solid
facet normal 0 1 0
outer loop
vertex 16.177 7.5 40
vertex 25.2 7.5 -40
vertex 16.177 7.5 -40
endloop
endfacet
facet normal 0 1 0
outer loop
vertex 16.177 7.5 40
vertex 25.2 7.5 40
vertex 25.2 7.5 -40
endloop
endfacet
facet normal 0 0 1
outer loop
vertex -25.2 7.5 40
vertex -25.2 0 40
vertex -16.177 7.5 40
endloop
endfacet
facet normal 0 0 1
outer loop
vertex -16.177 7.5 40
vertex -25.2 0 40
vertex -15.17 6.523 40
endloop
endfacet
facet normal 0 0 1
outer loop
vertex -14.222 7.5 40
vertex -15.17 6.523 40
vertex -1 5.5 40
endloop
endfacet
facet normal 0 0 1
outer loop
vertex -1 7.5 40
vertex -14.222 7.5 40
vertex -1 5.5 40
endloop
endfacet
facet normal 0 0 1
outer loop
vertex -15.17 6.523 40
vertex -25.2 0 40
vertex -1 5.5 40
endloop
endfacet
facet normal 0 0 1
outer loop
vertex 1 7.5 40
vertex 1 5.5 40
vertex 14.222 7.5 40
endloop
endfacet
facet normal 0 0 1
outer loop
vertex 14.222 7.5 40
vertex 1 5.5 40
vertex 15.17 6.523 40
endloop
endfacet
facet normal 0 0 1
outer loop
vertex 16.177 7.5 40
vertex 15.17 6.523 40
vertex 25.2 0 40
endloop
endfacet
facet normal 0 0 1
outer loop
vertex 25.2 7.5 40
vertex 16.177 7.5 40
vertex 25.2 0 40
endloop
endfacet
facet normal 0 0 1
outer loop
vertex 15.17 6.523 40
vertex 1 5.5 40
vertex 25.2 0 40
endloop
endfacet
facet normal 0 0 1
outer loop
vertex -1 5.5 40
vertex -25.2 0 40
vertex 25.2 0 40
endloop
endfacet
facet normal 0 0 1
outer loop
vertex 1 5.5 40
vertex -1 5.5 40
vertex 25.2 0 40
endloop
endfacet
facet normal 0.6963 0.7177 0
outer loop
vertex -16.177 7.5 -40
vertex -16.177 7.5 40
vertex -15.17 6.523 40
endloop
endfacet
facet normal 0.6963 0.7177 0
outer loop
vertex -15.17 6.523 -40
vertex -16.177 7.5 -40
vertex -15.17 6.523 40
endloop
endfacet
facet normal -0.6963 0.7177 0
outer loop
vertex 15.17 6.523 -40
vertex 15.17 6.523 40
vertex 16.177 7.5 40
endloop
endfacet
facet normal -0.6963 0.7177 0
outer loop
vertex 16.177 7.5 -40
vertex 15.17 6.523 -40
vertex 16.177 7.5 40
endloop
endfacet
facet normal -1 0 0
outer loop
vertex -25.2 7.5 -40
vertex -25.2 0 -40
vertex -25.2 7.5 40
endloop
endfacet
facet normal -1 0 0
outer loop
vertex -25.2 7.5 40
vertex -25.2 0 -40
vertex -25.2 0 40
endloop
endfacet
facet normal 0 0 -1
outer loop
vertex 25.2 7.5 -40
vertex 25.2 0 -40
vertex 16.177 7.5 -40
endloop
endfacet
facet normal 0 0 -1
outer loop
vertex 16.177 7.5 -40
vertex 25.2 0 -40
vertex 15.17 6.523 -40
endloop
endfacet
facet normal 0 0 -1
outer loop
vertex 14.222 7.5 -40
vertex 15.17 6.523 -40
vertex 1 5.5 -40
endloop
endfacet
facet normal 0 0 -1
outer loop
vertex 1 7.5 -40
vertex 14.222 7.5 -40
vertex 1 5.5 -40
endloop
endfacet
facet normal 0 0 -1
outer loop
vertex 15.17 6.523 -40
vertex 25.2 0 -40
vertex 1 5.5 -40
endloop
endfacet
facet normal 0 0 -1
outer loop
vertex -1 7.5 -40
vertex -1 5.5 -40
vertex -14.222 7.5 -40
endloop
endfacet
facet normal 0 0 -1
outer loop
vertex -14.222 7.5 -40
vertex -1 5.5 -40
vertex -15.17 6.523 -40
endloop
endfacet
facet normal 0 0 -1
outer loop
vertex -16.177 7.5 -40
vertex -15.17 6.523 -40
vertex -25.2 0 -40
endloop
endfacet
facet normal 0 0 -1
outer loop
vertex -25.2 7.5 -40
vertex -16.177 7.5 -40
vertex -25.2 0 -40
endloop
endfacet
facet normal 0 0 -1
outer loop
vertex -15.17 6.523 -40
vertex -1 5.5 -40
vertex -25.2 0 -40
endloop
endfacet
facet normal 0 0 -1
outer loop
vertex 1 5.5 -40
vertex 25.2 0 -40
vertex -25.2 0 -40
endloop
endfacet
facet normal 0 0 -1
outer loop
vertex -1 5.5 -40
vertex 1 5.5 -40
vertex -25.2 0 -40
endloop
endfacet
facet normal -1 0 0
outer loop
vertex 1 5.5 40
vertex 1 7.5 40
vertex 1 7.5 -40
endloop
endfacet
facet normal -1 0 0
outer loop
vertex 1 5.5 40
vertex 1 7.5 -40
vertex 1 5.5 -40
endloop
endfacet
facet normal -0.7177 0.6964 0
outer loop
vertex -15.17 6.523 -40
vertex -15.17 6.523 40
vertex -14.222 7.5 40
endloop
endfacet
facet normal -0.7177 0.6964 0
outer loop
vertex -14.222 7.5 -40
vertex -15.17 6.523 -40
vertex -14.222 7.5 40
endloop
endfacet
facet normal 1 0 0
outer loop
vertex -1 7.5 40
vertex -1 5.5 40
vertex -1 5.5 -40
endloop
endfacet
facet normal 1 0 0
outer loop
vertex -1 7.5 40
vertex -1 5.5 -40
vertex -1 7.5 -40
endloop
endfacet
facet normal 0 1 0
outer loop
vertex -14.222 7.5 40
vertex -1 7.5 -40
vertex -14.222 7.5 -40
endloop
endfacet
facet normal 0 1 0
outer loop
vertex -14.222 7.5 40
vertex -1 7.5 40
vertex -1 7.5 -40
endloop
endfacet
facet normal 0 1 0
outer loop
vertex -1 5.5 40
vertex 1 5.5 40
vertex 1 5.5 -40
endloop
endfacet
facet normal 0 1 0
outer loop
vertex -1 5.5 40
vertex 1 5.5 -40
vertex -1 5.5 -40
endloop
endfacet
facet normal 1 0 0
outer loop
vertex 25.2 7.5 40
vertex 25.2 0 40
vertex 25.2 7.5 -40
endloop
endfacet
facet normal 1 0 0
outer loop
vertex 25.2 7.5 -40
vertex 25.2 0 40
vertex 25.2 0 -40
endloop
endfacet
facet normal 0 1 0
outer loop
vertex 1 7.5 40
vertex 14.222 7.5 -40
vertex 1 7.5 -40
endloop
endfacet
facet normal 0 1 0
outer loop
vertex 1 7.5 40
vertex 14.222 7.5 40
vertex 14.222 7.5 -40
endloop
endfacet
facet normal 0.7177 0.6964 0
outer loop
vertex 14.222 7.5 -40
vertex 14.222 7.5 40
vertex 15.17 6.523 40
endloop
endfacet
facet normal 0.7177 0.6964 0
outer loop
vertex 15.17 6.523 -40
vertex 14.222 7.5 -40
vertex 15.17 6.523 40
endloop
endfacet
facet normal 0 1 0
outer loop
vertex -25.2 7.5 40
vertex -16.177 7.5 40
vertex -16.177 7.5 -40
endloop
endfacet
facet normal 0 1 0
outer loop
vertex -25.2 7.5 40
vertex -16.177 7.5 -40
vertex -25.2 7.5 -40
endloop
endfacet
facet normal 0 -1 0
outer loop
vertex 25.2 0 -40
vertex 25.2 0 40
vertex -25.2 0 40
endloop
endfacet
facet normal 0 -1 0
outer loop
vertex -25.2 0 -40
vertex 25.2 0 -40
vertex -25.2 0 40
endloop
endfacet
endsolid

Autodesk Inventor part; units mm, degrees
ref_plane "YZ Plane" through (0, 0, 0) normal (1, 0, 0) x (0, 1, 0)
ref_plane "XZ Plane" through (0, 0, 0) normal (0, 1, 0) x (-1, 0, 0)
ref_plane "XY Plane" through (0, 0, 0) normal (0, 0, 1) x (1, 0, 0)
sketch "Sketch1" plane through (0, 0, 0) normal (0, 1, 0) x (-1, 0, 0)
  line L0 (-25.2, 40) -> (-25.2, -40)
  line L1 (-25.2, -40) -> (25.2, -40)
  line L2 (25.2, -40) -> (25.2, 40)
  line L3 (25.2, 40) -> (-25.2, 40)
  line L4 (-25.2, 40) -> (25.2, -40) construction
  line L5 (-25.2, -40) -> (25.2, 40) construction
  point P0 (0, 0)
  dimension "d0" = 80
  dimension "d1" = 50.4
extrude "Extrusion1" add sketch "Sketch1" along normal blind 7.5
sketch "Sketch2" plane through (0, 7.5, 0) normal (0, 1, 0) x (1, 0, 0)
  line L0 (25.2, 40) -> (-25.2, 40) projected
  line L1 (-25.2, 40) -> (-15.2, 40)
  line L2 (-15.2, 40) -> (-15.2, -40)
  line L3 (-25.2, -40) -> (25.2, -40) projected
  line L4 (0, 40) -> (0, -40)
  line L5 (25.2, 40) -> (15.2, 40)
  line L6 (15.2, 40) -> (15.2, -40)
  line L7 (-14.2233, -40) -> (-14.2233, 40)
  line L8 (-14.2233, 40) -> (-16.1767, 40)
  line L9 (-16.1767, 40) -> (-16.1767, -40)
  line L10 (-16.1767, -40) -> (-14.2233, -40)
  line L11 (-14.2233, -40) -> (-16.1767, 40) construction
  line L12 (-14.2233, 40) -> (-16.1767, -40) construction
  point P0 (0, 0)
  point P1 (-15.2, 0)
  dimension "d4" = 10
  dimension "d5" = 10
sketch "Sketch3" plane through (-25.2, 0, 40) normal (0, 0, 1) x (1, 0, 0)
  point P0 (25.2, 0)
sketch "Sketch4" plane through (-25.2, 0, 40) normal (0, 0, 1) x (1, 0, 0)
  line L0 (0, 7.5) -> (50.4, 7.5) projected
  line L1 (9.0233, 7.5) -> (10.9782, 7.5)
  line L2 (9.0233, 7.5) -> (10.0298, 6.523)
  line L3 (10.0298, 6.523) -> (10.9782, 7.5)
  point P0 (25.2, 0)
extrude "Extrusion2" cut sketch "Sketch4" against normal up to surface (80 mm away)
ref_plane "Work Plane1" through (0, 0, -40) normal (-1, 0, 0) x (0, 0, 1)
mirror "Mirror1" about plane through (0, 0, -40) normal (-1, 0, 0) of "Extrusion2"
ref_plane "Work Plane2" through (12.6, 0, -40) normal (-1, 0, 0) x (0, 0, 1)
sketch "Sketch5" plane through (25.2, 0, -40) normal (0, 0, -1) x (-1, 0, 0)
  line L0 (39.4218, 7.5) -> (10.9782, 7.5) projected
  line L1 (25.2, 7.5) -> (24.2, 7.5)
  line L2 (24.2, 7.5) -> (24.2, 5.5)
  line L3 (24.2, 5.5) -> (26.2, 5.5)
  line L4 (26.2, 5.5) -> (26.2, 7.5)
  line L5 (24.2, 7.5) -> (26.2, 7.5)
  point P0 (25.2, 0)
  dimension "d8" = 1
  dimension "d9" = 2
  dimension "d10" = 2
extrude "Extrusion3" cut sketch "Sketch5" against normal up to surface (80 mm away)
ref_plane "Work Plane3" through (-25.2, 0, 0) normal (0, 0, 1) x (1, 0, 0)
properties part number "Circuit Board"
